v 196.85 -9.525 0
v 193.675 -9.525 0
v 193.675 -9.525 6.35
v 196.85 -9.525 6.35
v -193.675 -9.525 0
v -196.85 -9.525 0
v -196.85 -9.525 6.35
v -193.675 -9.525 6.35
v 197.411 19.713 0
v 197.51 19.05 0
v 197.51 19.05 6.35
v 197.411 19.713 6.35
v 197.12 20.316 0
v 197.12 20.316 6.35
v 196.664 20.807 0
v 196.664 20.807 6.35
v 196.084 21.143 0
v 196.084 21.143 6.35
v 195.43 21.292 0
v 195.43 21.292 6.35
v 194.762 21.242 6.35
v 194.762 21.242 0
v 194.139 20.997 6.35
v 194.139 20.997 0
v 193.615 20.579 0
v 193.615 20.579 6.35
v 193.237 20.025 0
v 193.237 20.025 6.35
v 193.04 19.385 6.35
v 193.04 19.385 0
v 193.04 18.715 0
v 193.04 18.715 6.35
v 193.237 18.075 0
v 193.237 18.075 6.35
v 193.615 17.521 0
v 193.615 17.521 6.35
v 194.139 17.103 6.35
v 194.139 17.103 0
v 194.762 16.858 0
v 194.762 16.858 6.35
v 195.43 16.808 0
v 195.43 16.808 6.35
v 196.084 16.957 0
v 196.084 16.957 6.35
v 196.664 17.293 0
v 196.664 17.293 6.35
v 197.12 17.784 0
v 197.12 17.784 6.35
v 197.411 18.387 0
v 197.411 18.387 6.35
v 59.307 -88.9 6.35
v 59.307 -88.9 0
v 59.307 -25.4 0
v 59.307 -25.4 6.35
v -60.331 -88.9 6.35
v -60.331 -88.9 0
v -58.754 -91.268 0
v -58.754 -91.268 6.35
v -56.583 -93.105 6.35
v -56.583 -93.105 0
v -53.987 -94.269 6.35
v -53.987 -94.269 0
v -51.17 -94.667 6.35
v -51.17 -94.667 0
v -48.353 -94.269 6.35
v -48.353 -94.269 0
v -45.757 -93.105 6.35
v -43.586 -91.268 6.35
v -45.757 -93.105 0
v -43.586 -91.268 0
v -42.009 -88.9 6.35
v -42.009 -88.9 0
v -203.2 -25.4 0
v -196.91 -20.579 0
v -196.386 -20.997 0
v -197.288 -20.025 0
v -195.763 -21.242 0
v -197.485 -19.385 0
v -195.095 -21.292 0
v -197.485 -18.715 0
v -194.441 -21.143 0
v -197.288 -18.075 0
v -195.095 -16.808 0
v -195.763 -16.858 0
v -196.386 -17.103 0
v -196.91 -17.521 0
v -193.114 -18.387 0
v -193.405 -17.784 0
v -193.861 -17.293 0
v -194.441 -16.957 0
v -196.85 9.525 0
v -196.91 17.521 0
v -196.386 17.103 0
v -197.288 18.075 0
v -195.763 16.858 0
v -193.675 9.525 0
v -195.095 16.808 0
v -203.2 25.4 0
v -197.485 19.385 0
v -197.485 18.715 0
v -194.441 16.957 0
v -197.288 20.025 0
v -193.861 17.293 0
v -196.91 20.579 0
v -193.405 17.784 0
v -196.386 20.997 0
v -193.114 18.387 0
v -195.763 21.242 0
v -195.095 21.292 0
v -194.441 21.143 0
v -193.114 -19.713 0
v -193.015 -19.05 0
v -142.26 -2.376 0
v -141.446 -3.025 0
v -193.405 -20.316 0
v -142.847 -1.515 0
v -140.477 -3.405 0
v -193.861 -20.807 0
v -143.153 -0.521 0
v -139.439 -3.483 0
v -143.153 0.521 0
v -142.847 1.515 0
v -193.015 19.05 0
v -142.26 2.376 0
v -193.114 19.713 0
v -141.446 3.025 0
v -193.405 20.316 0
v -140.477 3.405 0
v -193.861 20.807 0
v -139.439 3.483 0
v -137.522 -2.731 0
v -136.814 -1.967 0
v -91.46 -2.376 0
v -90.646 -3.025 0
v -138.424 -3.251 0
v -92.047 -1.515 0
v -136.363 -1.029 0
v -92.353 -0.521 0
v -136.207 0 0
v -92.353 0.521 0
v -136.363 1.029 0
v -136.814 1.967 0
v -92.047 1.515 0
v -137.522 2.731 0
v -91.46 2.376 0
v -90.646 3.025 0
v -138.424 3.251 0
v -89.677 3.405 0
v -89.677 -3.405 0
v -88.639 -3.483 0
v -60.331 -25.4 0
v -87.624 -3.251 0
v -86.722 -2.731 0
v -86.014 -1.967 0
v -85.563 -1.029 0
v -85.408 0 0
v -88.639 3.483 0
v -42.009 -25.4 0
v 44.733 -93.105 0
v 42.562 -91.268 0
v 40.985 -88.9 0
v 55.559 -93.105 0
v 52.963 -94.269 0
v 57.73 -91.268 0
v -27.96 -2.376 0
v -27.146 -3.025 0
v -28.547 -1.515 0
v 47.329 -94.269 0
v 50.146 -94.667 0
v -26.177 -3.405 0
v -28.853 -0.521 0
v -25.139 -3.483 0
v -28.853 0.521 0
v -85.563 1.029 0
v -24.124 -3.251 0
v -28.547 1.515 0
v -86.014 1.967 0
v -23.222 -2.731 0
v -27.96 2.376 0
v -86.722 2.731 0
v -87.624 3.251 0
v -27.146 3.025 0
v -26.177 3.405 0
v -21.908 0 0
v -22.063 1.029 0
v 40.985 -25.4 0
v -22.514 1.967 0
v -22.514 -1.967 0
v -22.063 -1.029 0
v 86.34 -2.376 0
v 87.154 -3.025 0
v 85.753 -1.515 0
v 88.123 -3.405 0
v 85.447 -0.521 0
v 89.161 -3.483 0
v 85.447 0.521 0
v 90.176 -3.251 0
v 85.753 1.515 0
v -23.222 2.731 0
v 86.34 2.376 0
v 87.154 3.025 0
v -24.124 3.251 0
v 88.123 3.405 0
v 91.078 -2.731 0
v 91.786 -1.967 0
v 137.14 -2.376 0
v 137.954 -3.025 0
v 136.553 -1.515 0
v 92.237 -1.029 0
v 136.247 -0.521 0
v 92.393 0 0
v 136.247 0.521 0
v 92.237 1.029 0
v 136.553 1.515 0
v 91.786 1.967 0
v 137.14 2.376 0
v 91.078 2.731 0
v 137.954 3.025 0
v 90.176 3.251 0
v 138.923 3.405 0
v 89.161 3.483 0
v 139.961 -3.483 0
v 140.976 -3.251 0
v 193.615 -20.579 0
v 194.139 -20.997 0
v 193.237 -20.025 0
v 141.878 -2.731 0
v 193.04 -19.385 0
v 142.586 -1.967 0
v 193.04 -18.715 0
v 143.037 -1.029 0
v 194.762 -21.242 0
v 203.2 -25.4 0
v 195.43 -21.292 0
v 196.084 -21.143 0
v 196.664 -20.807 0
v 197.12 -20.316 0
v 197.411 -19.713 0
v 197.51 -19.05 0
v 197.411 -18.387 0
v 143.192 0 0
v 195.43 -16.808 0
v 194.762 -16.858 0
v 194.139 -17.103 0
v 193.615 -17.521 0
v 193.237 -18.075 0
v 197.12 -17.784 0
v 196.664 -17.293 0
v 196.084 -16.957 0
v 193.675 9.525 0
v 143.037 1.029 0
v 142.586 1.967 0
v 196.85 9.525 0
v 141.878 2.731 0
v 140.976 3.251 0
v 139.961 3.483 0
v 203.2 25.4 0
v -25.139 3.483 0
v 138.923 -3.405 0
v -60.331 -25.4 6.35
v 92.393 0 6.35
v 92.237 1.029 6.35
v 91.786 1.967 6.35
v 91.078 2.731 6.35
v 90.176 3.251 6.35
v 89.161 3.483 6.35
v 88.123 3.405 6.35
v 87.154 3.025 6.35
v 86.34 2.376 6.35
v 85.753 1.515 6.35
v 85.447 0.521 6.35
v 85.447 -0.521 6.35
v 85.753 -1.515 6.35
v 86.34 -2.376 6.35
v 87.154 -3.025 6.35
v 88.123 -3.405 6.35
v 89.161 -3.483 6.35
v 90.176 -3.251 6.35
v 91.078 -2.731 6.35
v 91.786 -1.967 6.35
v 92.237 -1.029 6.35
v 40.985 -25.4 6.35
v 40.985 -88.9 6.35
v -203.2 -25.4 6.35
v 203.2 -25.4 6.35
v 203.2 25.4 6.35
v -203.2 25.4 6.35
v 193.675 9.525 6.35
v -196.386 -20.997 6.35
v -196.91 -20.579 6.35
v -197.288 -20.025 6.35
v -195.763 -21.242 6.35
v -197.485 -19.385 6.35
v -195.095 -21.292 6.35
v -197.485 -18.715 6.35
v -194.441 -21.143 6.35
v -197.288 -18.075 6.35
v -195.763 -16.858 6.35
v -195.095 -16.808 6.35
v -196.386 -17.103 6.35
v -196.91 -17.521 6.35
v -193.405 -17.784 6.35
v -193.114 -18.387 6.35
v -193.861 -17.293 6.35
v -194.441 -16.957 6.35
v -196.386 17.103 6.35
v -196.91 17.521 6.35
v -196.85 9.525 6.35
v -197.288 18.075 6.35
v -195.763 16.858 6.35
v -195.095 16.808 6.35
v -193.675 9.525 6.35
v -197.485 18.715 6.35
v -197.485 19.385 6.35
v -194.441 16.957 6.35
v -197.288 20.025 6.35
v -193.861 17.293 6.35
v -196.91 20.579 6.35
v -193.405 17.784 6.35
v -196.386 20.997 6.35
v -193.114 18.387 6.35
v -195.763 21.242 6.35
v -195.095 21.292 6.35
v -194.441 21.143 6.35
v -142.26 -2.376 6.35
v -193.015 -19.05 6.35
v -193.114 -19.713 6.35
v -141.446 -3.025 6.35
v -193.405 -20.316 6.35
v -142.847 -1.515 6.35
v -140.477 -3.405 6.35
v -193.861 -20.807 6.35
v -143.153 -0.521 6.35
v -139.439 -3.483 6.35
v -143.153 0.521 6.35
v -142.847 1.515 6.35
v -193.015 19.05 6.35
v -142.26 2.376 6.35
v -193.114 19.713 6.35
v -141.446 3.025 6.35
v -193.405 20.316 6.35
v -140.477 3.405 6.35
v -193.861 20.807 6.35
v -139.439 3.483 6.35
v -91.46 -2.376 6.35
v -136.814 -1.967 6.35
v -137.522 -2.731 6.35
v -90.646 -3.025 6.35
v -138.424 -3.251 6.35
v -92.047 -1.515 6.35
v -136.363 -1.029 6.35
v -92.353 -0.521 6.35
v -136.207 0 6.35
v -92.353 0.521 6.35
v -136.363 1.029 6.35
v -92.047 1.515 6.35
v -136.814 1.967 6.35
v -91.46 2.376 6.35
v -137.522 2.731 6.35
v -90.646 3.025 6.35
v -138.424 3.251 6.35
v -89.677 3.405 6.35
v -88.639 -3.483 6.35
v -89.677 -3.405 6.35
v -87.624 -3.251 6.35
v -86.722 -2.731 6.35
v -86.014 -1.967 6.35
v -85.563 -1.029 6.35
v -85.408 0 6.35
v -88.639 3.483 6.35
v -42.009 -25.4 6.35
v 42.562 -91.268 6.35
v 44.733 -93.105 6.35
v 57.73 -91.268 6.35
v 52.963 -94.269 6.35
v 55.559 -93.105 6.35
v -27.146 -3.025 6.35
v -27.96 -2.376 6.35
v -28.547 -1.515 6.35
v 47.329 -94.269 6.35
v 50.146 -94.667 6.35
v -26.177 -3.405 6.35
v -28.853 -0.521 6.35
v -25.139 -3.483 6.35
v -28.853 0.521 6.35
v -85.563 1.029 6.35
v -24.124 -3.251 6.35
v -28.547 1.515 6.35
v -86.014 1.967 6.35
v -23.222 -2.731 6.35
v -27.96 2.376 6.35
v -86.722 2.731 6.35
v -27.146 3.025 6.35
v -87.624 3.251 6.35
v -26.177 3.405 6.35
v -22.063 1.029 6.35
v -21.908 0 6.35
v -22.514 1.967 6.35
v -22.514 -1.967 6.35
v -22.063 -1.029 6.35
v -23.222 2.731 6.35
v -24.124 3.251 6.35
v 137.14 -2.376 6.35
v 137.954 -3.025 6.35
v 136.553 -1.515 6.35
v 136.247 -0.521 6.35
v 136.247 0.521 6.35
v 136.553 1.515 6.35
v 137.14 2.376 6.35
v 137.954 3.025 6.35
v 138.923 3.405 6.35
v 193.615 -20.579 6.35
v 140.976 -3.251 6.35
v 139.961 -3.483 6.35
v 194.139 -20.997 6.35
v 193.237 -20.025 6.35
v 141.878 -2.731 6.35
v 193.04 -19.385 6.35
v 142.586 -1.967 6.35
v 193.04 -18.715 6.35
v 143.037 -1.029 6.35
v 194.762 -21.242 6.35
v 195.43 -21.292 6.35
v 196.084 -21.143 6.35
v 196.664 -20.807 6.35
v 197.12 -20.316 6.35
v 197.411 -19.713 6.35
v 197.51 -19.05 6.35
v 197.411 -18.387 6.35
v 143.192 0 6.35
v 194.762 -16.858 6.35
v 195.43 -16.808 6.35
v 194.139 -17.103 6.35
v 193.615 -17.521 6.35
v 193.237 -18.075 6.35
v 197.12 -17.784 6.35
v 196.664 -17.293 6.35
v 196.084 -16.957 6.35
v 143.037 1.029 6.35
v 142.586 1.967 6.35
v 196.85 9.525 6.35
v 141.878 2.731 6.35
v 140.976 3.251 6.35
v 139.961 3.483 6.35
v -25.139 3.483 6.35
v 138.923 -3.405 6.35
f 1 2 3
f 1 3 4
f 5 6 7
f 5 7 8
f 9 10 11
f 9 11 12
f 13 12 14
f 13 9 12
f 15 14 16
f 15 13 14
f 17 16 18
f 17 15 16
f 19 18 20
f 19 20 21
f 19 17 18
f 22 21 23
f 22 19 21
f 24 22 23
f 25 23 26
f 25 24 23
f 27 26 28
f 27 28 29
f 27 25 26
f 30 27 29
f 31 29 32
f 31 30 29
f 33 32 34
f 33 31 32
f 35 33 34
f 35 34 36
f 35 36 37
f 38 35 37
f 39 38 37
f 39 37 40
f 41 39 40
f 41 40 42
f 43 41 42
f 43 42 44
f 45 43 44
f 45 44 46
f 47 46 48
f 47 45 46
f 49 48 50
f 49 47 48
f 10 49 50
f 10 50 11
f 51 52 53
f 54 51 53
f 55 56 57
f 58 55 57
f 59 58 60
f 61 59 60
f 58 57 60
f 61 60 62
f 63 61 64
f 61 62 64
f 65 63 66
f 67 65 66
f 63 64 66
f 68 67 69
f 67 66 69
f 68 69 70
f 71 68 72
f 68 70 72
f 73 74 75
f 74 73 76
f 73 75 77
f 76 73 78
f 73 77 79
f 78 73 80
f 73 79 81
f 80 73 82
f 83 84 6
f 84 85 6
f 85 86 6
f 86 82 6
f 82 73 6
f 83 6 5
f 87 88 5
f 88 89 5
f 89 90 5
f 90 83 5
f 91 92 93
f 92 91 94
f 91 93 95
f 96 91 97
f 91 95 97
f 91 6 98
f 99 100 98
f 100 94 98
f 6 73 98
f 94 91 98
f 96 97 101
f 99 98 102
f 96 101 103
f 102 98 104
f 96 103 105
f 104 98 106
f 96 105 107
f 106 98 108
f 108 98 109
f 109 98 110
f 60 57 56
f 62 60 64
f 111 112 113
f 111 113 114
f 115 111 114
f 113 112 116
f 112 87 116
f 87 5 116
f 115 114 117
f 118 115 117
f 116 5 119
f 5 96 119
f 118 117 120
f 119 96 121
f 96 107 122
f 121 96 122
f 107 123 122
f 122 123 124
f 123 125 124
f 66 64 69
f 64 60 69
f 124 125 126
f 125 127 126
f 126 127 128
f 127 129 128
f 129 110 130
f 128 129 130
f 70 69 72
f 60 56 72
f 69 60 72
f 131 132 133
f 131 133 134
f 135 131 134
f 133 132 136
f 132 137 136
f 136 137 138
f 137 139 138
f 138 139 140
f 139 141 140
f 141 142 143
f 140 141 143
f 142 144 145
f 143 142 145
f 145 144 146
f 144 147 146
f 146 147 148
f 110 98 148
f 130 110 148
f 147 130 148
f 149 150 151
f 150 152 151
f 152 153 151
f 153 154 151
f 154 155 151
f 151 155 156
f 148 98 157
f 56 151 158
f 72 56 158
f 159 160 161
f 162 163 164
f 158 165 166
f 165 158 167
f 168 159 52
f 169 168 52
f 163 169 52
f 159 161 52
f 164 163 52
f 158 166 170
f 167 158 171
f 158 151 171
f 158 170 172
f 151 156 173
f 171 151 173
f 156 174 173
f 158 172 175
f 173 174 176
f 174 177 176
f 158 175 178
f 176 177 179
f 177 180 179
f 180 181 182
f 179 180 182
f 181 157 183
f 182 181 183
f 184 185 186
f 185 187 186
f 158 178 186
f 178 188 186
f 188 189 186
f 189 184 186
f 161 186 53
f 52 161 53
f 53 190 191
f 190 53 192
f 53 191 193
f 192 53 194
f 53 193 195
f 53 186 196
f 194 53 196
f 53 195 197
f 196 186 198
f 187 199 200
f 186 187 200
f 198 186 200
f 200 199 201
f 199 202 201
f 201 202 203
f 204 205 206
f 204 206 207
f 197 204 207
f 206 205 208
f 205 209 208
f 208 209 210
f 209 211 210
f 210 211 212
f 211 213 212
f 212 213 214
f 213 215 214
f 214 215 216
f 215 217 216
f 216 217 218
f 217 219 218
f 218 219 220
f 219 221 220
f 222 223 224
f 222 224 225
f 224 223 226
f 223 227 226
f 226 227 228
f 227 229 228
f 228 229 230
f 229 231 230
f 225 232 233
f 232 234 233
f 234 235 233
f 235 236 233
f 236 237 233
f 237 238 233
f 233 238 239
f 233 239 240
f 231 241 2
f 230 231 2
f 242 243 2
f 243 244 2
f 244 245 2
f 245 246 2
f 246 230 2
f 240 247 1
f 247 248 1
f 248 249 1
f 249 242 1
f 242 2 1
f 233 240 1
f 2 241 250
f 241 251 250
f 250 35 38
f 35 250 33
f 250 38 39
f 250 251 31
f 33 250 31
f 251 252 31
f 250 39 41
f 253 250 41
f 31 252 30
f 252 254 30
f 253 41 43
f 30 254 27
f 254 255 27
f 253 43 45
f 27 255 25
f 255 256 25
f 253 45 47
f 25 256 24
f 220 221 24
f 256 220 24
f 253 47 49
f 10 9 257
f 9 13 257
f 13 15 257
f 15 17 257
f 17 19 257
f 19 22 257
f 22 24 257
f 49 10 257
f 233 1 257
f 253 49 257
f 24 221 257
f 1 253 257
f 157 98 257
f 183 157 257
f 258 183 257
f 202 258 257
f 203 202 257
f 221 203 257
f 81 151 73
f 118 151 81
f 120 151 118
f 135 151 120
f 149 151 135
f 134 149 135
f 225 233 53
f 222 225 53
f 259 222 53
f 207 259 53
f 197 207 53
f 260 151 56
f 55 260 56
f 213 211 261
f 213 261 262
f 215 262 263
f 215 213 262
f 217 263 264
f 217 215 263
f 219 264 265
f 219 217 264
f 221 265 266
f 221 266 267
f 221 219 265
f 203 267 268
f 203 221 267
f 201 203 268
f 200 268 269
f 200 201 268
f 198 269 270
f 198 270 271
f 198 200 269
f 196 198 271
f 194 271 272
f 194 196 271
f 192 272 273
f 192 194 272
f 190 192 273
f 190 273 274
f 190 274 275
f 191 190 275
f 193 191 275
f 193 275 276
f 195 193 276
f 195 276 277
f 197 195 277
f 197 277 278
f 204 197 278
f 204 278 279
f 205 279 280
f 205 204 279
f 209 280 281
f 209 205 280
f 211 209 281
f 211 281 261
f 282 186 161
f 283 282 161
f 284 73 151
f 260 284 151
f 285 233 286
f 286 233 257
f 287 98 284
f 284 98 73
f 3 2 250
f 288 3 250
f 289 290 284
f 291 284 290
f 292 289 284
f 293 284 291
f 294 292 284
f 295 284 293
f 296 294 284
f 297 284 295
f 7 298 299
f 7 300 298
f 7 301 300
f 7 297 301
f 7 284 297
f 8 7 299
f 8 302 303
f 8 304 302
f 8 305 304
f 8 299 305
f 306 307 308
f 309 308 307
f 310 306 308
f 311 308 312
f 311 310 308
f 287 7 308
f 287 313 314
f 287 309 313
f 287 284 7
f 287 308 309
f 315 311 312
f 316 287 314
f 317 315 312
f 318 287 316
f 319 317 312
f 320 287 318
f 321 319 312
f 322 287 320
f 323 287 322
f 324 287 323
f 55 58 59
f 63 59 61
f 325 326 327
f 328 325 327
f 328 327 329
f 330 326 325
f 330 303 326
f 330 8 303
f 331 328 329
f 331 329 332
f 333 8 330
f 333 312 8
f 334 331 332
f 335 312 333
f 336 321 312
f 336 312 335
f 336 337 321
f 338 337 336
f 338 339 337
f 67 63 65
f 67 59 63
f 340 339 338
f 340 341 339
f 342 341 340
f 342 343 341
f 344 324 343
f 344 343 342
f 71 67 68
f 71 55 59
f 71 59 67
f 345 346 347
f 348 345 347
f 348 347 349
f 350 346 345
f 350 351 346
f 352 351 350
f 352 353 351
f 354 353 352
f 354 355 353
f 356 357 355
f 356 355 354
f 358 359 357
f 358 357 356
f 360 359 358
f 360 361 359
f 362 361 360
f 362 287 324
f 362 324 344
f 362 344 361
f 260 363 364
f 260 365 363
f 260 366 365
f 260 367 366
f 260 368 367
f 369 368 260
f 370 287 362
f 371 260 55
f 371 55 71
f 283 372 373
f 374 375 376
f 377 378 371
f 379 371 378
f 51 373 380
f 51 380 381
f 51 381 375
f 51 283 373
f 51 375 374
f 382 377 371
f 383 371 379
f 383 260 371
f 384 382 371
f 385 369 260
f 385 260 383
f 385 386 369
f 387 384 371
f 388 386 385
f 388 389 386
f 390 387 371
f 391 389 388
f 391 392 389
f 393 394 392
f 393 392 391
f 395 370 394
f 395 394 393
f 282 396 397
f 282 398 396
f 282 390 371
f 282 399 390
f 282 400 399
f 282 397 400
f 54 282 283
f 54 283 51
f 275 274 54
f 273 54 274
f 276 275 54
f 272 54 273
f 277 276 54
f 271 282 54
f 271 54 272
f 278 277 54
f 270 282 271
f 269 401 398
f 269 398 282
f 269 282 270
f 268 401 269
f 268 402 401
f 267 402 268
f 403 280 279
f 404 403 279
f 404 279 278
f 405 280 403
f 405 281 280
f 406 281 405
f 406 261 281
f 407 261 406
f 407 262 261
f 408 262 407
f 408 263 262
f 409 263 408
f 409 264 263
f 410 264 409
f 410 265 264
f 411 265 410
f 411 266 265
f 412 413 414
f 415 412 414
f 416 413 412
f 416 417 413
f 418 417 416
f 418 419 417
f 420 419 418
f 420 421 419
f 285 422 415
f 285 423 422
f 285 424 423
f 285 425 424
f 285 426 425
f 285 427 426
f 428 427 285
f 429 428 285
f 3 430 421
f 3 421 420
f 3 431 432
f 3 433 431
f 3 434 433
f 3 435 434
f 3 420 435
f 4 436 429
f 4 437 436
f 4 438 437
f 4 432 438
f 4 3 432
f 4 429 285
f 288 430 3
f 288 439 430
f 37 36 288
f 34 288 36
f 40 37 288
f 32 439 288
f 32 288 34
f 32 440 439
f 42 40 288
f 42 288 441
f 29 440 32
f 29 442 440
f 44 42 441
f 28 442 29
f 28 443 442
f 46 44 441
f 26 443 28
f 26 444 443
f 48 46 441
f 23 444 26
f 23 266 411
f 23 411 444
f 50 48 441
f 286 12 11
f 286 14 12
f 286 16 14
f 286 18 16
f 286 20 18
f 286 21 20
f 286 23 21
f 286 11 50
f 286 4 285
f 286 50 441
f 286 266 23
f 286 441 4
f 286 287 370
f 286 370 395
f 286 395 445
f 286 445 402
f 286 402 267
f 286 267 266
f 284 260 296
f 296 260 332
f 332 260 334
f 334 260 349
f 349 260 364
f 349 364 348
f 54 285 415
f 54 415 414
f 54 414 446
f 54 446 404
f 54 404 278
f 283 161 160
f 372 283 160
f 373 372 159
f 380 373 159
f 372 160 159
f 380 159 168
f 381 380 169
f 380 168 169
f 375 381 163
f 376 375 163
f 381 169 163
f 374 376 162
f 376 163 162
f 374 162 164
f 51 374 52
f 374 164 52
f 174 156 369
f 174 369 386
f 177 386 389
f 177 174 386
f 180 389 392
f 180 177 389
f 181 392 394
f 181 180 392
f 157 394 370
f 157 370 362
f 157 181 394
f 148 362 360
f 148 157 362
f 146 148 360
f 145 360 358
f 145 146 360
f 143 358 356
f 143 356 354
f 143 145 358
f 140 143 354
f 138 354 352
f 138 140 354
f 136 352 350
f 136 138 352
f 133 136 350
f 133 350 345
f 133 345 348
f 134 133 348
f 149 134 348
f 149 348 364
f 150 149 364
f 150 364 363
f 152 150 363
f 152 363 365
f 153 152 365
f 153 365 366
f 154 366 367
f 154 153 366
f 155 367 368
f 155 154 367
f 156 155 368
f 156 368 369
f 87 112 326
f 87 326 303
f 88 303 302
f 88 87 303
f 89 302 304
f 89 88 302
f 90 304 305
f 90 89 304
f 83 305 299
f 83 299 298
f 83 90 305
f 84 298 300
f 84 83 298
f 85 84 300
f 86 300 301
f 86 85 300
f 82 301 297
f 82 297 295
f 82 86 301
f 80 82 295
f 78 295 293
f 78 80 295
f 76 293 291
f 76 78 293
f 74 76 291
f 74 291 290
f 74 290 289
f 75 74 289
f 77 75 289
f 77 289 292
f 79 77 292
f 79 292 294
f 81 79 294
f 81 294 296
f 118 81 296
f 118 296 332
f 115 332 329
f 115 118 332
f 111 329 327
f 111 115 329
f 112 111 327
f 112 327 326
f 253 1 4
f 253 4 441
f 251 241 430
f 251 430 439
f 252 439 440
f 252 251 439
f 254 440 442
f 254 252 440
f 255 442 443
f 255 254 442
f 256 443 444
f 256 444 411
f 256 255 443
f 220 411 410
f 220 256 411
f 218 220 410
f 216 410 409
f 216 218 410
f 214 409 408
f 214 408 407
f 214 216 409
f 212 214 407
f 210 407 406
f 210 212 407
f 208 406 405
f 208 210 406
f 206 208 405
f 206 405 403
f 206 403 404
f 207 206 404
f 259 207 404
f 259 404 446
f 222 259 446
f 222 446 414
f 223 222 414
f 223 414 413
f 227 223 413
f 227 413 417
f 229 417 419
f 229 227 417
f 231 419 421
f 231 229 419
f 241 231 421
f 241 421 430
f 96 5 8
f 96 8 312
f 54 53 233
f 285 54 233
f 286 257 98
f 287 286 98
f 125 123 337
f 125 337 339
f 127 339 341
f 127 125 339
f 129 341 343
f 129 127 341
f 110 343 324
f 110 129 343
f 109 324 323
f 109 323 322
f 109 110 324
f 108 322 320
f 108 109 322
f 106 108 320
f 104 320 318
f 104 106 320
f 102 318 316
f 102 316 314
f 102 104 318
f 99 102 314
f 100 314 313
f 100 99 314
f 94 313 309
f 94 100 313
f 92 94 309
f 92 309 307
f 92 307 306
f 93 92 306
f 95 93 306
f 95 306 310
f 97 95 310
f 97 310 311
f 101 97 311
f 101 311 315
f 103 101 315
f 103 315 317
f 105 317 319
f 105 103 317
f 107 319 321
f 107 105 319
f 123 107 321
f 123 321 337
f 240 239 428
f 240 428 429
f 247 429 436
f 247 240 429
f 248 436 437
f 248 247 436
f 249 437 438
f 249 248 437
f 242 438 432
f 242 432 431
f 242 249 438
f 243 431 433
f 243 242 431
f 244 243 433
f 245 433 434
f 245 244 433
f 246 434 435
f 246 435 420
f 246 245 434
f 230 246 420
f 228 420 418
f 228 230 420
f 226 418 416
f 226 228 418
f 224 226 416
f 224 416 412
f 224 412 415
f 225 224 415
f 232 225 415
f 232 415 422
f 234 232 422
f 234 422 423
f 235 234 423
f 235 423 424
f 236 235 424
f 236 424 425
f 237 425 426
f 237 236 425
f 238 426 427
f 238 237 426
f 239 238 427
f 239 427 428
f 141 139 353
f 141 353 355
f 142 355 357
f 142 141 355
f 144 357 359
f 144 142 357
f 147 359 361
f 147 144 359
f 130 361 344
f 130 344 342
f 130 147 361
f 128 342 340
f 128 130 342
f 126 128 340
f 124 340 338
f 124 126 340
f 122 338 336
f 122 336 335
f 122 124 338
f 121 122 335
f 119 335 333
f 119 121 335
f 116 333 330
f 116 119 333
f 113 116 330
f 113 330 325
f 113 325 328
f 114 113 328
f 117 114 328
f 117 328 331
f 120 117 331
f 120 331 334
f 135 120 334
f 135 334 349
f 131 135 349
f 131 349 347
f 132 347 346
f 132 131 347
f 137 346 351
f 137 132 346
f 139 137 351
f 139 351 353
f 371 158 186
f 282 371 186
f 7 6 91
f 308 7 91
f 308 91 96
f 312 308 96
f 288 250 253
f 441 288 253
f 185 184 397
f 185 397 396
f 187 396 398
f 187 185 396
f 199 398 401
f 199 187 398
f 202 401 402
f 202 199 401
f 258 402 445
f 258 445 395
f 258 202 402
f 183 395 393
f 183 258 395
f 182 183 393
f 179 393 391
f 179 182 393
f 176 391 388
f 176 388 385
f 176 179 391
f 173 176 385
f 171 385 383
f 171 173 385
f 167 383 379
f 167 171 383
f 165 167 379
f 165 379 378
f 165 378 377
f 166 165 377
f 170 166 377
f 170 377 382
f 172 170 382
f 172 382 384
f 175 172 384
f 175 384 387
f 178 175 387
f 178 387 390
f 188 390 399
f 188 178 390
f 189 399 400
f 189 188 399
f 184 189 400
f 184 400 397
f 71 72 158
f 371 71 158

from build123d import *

# Parameters (mm, degrees)
F0_R     = 2.2479
F0_W     = 3.175
F0_H     = 19.05
F0_R_2   = 3.4925
F1_DEPTH = 6.35


with BuildPart() as f1:
    # F0 (on Top) → F1 (new body)
    with BuildSketch(Plane.XY):
        Polygon((203.2, -25.4), (203.2, 25.4), (-203.2, 25.4), (-203.2, -25.4), (-60.331323, -25.4), (-42.008828, -25.4), (40.984878, -25.4), (59.307373, -25.4), align=None)
        with Locations((-195.2625, -19.05)):
            Circle(F0_R, mode=Mode.SUBTRACT)
        with Locations((-195.2625, 0)):
            Rectangle(F0_W, F0_H, mode=Mode.SUBTRACT)
        with Locations((-139.7, 0)):
            Circle(F0_R_2, mode=Mode.SUBTRACT)
        with Locations((-195.2625, 19.05)):
            Circle(F0_R, mode=Mode.SUBTRACT)
        with Locations((-88.9, 0)):
            Circle(F0_R_2, mode=Mode.SUBTRACT)
        with Locations((-25.4, 0)):
            Circle(F0_R_2, mode=Mode.SUBTRACT)
        with Locations((195.2625, -19.05)):
            Circle(F0_R, mode=Mode.SUBTRACT)
        with Locations((88.9, 0)):
            Circle(F0_R_2, mode=Mode.SUBTRACT)
        with Locations((139.7, 0)):
            Circle(F0_R_2, mode=Mode.SUBTRACT)
        with Locations((195.2625, 0)):
            Rectangle(F0_W, F0_H, mode=Mode.SUBTRACT)
        with Locations((195.2625, 19.05)):
            Circle(F0_R, mode=Mode.SUBTRACT)
        with BuildLine():
            Line((59.307373, -88.9), (59.307373, -25.4))
            Line((59.307373, -25.4), (40.984878, -25.4))
            Line((40.984878, -25.4), (40.984878, -88.9))
            ThreePointArc((40.984878, -88.9), (50.146126, -94.667148), (59.307373, -88.9))
        make_face()
        with BuildLine():
            Line((-42.008828, -25.4), (-60.331323, -25.4))
            Line((-60.331323, -25.4), (-60.331323, -88.9))
            ThreePointArc((-60.331323, -88.9), (-51.170076, -94.667148), (-42.008828, -88.9))
            Line((-42.008828, -88.9), (-42.008828, -25.4))
        make_face()
    extrude(amount=F1_DEPTH)


solid = f1.part
